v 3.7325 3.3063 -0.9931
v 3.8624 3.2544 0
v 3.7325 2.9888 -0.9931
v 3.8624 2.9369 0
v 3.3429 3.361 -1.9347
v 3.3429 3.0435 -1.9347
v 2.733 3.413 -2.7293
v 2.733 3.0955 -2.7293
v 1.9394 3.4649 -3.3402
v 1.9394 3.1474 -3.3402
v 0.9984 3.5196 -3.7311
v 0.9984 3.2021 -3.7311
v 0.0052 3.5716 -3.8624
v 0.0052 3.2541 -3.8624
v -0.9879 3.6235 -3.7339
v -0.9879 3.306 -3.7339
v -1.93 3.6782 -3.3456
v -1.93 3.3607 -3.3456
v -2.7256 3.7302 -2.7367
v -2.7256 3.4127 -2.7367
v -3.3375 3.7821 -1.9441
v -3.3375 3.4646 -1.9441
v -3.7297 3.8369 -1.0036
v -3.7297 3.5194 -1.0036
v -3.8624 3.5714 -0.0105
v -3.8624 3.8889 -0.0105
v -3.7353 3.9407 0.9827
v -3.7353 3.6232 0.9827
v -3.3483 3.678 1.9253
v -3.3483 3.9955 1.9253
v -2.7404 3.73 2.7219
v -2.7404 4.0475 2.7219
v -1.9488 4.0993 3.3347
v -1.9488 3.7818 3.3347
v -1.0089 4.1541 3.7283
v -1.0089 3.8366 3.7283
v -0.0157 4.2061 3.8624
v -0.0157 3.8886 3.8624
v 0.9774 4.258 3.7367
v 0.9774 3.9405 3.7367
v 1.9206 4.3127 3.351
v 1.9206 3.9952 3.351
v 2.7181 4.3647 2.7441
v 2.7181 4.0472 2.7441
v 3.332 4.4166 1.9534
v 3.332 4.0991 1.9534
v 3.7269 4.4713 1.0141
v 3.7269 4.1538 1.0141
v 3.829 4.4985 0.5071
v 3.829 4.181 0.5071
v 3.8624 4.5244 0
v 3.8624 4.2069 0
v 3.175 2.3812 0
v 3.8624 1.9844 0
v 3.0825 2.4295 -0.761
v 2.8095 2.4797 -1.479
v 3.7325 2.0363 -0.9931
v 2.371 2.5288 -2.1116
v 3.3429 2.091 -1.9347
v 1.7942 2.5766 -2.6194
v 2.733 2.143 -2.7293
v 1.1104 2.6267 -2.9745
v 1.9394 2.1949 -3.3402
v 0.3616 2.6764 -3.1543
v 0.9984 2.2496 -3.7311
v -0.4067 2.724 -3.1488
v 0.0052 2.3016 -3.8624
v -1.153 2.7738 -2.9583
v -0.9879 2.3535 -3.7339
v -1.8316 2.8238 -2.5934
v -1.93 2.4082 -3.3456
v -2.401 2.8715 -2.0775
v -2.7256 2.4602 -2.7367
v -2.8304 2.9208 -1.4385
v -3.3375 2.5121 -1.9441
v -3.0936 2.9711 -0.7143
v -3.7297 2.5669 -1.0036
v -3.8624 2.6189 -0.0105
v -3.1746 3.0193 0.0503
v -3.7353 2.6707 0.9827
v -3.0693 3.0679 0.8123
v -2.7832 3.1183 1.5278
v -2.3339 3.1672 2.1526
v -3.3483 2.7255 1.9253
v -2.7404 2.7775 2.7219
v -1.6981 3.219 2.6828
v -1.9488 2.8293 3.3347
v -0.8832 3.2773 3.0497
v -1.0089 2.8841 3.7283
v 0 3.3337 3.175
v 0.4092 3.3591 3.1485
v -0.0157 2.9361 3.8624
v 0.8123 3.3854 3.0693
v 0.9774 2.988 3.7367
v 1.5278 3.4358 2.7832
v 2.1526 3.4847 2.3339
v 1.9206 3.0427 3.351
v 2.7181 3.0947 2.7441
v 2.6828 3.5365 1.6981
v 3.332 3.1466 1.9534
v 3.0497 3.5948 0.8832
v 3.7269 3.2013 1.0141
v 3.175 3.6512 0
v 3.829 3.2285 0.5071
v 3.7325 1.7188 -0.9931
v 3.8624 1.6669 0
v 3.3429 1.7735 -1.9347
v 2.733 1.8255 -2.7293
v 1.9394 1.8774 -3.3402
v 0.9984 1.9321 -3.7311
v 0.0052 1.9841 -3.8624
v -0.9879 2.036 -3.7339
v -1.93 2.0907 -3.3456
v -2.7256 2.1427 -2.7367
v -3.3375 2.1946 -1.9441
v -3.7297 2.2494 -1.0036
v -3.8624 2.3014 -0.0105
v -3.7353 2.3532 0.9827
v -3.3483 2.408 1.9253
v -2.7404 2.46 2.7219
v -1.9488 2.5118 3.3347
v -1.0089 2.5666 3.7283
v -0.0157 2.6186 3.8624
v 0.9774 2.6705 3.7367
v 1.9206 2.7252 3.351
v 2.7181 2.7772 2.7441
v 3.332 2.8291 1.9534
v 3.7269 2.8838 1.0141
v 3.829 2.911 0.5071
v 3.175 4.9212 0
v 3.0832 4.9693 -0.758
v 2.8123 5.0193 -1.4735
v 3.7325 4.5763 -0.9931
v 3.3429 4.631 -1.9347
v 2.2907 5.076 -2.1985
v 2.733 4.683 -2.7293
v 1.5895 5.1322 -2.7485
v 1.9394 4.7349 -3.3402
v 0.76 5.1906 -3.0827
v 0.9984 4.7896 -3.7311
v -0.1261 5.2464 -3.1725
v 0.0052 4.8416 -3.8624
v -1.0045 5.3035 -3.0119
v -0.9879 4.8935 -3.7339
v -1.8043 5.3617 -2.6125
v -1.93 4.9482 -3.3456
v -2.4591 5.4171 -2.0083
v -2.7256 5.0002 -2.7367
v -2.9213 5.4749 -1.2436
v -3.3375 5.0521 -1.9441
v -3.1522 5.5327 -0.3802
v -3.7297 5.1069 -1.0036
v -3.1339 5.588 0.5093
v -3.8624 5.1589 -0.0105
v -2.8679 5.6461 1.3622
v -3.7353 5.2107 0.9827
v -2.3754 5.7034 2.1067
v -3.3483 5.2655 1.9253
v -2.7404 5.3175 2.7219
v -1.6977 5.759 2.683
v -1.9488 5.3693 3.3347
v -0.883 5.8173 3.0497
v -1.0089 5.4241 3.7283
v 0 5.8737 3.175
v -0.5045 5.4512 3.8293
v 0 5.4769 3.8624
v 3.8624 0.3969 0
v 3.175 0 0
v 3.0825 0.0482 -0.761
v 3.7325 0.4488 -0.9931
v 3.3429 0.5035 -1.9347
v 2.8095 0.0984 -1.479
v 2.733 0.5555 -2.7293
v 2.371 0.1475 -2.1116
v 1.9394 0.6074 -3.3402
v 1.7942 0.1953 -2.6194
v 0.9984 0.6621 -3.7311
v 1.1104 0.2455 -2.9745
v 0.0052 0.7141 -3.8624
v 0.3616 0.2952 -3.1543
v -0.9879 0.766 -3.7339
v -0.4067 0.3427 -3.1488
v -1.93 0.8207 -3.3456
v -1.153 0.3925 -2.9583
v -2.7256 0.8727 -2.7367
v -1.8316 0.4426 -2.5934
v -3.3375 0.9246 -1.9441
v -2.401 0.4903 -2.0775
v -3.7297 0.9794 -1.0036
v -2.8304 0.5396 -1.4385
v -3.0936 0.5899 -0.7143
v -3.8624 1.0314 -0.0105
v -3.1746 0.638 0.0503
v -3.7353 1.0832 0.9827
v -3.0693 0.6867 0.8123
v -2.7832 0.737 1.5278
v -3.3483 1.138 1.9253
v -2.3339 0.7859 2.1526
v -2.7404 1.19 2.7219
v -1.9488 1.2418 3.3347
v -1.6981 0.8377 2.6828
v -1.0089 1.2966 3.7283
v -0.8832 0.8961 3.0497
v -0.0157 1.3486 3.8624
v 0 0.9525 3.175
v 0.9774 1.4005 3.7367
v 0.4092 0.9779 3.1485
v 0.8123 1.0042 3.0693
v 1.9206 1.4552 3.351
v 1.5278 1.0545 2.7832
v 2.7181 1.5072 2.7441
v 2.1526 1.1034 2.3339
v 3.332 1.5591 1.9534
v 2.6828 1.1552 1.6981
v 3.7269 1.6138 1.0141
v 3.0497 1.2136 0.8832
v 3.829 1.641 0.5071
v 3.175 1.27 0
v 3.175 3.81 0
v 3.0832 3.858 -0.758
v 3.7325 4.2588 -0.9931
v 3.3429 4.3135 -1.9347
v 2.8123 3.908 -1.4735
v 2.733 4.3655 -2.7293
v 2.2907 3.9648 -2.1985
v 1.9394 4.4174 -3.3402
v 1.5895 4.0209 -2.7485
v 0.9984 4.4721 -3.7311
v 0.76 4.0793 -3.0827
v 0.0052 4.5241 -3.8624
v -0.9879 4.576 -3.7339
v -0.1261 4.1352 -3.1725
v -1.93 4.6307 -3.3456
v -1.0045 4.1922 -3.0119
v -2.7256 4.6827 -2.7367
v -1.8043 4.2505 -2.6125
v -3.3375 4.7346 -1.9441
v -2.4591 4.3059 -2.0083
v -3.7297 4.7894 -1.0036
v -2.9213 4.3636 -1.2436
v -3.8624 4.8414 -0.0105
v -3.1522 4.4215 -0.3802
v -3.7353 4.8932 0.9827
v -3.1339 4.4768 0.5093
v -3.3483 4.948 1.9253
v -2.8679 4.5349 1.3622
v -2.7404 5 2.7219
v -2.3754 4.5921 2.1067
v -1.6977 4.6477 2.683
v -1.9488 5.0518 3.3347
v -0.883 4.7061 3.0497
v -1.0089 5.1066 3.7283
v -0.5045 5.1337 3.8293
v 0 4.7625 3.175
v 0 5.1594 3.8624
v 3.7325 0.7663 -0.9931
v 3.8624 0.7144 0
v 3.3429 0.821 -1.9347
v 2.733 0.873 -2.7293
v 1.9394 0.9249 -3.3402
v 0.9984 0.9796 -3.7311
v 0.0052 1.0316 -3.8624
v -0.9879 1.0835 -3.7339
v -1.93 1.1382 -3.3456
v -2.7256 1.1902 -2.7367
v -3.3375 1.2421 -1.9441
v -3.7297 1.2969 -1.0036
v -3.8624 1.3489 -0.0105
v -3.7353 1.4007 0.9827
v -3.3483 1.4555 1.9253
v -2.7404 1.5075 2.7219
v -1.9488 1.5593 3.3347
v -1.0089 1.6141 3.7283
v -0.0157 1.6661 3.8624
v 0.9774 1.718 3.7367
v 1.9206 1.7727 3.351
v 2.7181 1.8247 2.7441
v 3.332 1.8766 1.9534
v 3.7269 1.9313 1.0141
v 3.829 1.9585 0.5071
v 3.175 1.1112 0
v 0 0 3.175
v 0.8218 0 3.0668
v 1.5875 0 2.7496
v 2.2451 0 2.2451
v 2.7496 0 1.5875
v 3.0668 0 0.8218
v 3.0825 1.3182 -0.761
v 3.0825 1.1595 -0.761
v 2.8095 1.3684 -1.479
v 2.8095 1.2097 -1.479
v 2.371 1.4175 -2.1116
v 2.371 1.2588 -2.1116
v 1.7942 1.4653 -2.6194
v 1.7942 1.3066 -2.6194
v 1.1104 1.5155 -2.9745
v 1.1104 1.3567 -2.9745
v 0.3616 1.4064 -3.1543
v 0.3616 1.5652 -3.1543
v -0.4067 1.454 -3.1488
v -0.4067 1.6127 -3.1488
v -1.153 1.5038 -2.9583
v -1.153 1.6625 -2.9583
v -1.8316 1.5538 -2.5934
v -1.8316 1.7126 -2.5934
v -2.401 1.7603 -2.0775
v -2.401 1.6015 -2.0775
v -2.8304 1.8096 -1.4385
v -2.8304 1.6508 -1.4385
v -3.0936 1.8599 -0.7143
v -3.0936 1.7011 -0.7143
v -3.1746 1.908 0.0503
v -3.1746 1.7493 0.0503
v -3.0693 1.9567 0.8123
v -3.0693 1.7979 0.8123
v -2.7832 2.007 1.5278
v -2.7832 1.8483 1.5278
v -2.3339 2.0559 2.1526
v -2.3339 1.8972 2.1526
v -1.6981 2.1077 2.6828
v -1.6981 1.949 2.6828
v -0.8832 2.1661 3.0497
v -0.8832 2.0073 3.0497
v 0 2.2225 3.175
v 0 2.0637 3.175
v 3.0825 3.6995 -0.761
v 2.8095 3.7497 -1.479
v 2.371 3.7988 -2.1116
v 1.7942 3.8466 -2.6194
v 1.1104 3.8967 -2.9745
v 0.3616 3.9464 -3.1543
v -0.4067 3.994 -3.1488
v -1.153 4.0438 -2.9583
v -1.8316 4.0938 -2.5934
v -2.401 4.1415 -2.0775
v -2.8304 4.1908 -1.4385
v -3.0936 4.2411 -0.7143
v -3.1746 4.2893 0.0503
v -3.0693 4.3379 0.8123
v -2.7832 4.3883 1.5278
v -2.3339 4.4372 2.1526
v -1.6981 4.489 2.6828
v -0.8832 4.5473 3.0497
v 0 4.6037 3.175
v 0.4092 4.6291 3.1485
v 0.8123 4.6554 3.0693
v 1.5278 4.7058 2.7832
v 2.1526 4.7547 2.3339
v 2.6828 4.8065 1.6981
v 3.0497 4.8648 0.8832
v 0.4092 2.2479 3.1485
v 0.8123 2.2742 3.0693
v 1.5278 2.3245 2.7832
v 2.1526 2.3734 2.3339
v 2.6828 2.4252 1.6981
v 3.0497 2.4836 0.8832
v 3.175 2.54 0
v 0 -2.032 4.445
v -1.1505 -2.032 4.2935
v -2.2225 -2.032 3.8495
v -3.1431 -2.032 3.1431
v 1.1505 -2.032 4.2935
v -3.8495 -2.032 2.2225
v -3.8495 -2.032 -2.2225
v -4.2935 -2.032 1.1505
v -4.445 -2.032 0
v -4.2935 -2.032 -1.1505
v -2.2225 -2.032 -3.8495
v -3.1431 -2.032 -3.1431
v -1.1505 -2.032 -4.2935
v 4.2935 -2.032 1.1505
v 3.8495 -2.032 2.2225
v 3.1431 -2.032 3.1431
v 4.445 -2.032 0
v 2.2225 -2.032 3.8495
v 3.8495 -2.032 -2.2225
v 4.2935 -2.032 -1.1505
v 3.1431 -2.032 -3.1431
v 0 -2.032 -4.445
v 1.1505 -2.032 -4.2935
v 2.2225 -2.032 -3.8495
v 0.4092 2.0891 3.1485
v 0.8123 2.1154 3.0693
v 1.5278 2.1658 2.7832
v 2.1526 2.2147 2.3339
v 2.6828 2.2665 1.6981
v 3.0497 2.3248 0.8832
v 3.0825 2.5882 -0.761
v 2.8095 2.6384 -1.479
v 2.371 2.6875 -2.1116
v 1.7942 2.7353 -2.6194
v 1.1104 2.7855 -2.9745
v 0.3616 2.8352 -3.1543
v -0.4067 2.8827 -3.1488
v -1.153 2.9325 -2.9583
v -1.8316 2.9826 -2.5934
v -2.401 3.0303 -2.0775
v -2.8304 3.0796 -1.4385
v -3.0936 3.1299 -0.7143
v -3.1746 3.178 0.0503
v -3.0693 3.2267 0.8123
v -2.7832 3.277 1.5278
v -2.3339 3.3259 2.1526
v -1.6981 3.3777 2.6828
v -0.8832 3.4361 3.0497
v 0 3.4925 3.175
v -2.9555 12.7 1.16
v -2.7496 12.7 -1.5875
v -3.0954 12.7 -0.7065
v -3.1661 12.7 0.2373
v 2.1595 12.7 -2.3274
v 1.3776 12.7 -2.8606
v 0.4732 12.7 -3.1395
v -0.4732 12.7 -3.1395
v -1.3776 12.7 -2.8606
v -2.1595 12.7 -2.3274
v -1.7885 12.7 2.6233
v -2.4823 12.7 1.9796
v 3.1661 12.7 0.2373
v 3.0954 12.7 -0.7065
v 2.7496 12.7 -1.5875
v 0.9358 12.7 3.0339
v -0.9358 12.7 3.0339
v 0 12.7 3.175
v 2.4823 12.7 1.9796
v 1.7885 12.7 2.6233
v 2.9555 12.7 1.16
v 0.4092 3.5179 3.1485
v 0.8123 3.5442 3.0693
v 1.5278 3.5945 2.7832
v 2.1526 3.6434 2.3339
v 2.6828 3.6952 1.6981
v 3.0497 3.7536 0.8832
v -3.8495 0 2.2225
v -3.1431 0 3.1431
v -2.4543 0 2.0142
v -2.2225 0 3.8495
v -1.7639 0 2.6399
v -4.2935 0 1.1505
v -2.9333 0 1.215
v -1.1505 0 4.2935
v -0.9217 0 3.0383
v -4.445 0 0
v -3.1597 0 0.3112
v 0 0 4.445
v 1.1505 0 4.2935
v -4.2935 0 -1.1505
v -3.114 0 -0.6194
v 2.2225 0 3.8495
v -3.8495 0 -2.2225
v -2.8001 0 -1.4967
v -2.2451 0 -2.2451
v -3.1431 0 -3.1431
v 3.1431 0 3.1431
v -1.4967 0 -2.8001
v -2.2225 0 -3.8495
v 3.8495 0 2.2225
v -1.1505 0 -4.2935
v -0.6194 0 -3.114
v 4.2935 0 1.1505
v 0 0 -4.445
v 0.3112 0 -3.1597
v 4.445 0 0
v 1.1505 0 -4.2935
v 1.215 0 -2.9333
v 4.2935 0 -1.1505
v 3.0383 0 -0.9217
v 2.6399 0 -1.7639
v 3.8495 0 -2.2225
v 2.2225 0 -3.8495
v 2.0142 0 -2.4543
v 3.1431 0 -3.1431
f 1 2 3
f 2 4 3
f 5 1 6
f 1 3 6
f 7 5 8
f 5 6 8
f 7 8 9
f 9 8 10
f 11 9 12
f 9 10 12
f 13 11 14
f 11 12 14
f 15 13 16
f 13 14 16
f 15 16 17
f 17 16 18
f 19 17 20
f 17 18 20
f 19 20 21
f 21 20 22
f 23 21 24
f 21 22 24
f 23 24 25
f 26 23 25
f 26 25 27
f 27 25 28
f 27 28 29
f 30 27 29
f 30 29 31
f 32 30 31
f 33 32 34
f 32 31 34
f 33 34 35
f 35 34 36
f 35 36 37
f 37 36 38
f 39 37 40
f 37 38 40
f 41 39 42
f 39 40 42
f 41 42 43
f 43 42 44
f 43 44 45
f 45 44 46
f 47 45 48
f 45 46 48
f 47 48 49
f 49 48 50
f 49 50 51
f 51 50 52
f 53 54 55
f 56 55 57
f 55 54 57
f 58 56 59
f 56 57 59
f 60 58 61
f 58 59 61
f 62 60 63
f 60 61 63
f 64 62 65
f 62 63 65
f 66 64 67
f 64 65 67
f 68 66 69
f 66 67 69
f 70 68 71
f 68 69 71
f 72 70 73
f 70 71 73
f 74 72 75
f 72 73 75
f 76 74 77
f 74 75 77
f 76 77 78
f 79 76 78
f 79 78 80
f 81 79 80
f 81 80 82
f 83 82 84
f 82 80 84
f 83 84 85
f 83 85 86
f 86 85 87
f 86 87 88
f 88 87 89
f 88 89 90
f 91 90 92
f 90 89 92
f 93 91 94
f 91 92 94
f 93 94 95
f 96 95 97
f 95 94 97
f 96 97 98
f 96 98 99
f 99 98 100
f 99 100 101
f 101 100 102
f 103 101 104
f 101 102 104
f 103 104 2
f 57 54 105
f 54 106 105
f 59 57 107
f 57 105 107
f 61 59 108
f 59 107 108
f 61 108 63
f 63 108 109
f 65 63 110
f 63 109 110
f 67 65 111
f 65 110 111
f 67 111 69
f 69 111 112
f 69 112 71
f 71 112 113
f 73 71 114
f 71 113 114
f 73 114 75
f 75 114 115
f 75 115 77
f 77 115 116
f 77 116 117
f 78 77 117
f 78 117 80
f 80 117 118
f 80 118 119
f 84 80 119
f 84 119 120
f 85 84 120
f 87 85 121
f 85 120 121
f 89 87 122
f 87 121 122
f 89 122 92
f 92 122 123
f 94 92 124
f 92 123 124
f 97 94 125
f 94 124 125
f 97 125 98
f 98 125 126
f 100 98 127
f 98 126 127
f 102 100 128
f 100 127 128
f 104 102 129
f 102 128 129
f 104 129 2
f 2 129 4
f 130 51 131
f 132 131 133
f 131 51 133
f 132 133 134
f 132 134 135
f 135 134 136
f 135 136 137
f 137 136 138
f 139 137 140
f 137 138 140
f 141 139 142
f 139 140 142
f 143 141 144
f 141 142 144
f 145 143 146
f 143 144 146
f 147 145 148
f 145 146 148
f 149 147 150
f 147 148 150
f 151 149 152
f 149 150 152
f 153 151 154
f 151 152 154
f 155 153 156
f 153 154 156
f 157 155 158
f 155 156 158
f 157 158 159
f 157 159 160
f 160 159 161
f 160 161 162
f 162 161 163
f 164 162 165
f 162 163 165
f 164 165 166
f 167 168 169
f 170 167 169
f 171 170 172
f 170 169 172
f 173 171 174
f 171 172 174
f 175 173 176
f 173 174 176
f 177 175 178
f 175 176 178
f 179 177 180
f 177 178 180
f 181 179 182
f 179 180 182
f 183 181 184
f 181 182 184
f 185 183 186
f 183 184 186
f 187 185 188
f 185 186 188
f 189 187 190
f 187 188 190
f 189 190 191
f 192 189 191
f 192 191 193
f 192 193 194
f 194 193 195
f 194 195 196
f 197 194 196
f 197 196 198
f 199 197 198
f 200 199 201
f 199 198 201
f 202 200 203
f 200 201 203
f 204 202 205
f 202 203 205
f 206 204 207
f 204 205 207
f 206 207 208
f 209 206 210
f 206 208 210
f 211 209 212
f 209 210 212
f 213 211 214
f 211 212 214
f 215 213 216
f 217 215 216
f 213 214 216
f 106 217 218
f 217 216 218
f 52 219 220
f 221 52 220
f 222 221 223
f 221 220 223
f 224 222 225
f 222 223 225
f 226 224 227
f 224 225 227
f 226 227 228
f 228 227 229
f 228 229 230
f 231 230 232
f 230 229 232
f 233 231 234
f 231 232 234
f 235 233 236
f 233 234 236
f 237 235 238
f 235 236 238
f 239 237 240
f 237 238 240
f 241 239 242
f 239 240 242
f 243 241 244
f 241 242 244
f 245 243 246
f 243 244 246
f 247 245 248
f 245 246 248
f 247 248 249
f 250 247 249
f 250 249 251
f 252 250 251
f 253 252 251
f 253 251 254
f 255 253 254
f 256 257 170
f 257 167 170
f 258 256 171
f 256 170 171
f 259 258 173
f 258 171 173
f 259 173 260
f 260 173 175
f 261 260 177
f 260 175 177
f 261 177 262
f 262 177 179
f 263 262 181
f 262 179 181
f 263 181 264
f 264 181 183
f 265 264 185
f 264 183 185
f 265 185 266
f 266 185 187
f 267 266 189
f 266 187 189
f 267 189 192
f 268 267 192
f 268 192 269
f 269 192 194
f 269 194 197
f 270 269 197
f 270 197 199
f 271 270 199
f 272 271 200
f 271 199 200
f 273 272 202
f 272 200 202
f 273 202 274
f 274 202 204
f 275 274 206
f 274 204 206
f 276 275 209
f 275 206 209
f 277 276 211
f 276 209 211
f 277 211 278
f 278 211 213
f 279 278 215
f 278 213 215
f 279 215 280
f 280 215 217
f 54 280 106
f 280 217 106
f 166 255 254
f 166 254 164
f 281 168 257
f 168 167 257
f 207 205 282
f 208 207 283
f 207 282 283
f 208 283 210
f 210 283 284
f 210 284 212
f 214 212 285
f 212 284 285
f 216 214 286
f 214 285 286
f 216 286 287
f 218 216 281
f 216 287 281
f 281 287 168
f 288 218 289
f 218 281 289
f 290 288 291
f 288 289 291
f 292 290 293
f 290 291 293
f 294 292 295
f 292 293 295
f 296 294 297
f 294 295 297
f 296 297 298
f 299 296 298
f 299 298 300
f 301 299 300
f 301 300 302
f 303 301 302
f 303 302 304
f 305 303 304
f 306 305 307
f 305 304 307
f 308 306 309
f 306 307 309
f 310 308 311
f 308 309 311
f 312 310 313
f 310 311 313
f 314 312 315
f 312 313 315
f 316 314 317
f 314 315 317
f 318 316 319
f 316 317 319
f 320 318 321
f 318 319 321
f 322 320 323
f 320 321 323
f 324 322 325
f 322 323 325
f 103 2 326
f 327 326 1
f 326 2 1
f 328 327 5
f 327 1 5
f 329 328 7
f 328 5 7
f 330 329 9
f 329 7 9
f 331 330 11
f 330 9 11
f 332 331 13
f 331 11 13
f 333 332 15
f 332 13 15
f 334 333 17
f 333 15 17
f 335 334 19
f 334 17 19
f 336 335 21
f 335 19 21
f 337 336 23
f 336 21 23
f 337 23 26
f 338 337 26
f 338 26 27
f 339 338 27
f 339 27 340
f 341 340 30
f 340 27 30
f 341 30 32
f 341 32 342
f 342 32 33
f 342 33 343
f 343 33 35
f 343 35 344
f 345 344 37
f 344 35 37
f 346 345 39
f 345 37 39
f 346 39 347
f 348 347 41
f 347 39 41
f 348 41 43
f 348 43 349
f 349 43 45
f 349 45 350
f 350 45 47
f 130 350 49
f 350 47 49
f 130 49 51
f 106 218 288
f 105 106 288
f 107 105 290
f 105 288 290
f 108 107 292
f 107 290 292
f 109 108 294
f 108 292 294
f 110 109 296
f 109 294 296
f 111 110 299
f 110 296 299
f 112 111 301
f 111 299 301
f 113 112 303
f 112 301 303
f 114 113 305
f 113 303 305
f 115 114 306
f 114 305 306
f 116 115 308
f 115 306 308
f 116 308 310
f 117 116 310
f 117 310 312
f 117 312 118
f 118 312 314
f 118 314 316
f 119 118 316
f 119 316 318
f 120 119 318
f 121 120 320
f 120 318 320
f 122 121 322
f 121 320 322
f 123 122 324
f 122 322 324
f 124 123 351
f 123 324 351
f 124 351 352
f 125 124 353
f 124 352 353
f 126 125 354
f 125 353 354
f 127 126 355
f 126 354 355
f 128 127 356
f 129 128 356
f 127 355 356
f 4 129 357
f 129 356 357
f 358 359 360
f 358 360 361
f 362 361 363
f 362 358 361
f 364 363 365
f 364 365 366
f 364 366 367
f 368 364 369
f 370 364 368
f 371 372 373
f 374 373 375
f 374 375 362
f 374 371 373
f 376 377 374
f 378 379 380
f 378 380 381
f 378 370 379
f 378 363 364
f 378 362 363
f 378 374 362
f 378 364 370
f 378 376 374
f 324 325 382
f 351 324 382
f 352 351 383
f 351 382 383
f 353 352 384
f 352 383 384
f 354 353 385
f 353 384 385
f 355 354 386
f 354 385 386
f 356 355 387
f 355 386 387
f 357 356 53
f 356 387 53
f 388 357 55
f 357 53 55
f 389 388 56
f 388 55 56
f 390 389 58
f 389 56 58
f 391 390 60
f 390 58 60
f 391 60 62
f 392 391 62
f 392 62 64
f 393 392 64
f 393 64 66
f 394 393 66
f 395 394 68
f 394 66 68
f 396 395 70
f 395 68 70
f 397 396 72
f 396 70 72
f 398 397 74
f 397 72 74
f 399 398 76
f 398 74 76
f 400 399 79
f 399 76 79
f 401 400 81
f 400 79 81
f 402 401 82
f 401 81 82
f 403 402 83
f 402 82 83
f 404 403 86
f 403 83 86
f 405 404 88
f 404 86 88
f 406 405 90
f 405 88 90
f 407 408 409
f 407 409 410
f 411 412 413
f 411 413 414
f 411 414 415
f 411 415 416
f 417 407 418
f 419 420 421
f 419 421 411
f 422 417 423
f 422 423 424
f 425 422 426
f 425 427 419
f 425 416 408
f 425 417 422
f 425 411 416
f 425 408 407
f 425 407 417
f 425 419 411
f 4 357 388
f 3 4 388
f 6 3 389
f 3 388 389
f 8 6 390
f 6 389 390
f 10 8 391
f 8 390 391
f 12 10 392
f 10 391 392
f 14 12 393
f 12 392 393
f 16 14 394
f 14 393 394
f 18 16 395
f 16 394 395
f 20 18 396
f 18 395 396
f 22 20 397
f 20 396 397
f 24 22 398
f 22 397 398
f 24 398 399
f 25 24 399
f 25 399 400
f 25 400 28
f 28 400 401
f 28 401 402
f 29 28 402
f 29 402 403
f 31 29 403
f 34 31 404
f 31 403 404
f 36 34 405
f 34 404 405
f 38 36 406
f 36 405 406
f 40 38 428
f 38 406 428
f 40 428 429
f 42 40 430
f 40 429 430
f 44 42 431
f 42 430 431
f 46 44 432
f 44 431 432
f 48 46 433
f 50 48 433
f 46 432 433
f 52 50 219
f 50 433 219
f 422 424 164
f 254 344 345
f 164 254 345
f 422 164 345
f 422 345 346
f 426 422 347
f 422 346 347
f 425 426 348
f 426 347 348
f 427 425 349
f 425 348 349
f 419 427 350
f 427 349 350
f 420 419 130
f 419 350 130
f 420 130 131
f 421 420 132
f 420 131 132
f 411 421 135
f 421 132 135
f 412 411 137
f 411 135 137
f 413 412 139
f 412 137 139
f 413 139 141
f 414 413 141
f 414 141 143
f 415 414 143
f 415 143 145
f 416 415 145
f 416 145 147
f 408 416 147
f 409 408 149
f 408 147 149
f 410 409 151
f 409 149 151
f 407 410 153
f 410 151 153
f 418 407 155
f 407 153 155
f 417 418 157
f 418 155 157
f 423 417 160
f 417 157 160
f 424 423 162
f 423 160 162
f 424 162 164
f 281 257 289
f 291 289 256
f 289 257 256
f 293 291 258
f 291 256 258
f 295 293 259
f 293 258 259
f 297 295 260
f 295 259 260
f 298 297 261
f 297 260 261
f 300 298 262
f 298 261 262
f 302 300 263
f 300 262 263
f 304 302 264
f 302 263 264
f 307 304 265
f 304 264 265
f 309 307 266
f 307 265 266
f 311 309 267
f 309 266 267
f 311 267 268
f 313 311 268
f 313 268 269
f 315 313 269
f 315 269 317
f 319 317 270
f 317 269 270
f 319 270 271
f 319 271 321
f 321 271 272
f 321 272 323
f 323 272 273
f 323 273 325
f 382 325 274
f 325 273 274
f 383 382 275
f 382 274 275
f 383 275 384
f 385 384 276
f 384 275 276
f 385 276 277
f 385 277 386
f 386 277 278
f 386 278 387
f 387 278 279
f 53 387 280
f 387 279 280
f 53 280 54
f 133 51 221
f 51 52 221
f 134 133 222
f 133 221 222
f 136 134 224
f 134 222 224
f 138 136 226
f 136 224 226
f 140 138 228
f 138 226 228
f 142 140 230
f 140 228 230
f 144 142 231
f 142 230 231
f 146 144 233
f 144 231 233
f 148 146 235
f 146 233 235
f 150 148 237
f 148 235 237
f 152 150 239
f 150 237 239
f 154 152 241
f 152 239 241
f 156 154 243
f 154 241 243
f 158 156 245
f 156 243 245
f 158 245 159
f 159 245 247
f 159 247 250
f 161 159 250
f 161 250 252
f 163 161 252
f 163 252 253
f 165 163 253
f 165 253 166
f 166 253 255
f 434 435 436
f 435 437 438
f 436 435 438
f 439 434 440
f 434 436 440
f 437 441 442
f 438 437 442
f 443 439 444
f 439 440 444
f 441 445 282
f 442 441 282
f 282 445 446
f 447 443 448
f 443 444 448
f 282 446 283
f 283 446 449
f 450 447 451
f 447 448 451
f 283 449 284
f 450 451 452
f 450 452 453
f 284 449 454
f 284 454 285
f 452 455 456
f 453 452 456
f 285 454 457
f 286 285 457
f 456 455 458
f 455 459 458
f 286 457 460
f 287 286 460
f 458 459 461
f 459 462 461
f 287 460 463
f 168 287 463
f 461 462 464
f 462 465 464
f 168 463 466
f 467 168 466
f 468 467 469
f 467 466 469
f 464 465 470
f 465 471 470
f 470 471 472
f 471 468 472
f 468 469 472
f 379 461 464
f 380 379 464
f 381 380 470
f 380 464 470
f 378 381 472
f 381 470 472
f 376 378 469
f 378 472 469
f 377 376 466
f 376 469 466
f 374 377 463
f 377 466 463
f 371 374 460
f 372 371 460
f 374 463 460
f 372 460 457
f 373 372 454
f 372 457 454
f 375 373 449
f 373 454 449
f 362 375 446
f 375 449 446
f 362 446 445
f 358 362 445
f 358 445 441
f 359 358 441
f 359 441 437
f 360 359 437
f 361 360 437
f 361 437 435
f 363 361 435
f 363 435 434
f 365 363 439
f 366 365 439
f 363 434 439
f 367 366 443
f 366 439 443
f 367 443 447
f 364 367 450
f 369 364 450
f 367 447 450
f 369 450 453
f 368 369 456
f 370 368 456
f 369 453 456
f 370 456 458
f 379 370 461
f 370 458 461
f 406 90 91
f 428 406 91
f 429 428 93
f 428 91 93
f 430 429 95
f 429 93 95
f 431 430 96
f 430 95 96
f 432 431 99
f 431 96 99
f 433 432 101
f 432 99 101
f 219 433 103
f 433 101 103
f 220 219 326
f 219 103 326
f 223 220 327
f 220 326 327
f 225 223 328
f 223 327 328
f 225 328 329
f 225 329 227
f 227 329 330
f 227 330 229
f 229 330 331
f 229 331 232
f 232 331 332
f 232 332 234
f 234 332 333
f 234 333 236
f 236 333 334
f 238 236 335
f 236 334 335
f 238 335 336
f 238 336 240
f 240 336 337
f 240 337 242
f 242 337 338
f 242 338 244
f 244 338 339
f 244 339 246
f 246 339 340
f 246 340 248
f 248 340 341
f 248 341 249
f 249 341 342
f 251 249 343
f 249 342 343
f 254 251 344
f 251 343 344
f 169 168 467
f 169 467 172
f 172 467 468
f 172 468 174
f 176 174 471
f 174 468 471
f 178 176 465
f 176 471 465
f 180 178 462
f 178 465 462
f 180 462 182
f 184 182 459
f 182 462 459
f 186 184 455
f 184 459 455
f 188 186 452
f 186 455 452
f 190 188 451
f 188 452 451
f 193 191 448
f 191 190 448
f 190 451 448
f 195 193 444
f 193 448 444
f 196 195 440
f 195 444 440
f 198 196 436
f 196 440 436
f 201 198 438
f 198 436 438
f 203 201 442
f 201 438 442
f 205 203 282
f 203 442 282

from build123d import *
from build123d.topology import SkipClean

# Parameters (mm, degrees)
SKETCH2_R           = 3.175
BOSS_EXTRUDE1_DEPTH = 12.7
SKETCH3_R           = 4.445
BOSS_EXTRUDE2_DEPTH = 2.032
THREAD1_PITCH       = 1.27


with BuildPart() as part:
    # Sketch2 → Boss-Extrude1 (new body)
    with BuildSketch(Plane(origin=(0, 0, 0), x_dir=(1, 0, 0), z_dir=(0, 1, 0))):
        with Locations(Location((0, 0, 0), (0, 0, 270))):
            Circle(SKETCH2_R)
    extrude(amount=BOSS_EXTRUDE1_DEPTH)

    # Sketch3 → Boss-Extrude2 (add)
    with BuildSketch(Plane(origin=(0, 0, 0), x_dir=(-1, 0, 0), z_dir=(0, -1, 0))):
        with Locations(Location((0, 0, 0), (0, 0, 90))):
            Circle(SKETCH3_R)
    extrude(amount=BOSS_EXTRUDE2_DEPTH)

    # Thread1: the profile of Thread Profile1 profile screwed along a right-hand helix of 3.75 turns, 8 arcs to a turn; built about Z, then put on its axis
    with SkipClean():  # the faces are left unmerged after this step: merging them gives an invalid solid
        thread1_z = Axis((0, 0, 0), (0, 0, 1))
        thread1_corners = [(3.1747, 0, -0.000173205), (3.1747, 0, 1.111423202), (3.862407661, 0, 0.714374998), (3.862407661, 0, 0.396874998)]
        with BuildLine(mode=Mode.PRIVATE) as thread1_profile:
            Line(thread1_corners[0], thread1_corners[1])
            Line(thread1_corners[1], thread1_corners[2])
            Line(thread1_corners[2], thread1_corners[3])
            Line(thread1_corners[3], thread1_corners[0])
        thread1_cap = Face(thread1_profile.wire())
        thread1_turn_angles = [0, 22.5, 45, 67.5, 90, 112.5, 135, 157.5, 180, 202.5, 225, 247.5, 270, 292.5, 315, 337.5, 360]
        thread1_turn_weights = [1, 0.9238795325112867, 1, 0.9238795325112867, 1, 0.9238795325112867, 1, 0.9238795325112867, 1, 0.9238795325112867, 1, 0.9238795325112867, 1, 0.9238795325112867, 1, 0.9238795325112867, 1]
        thread1_turn_rails = [Edge.make_bspline([Vector(p[0], p[1], 0).rotate(thread1_z, thread1_turn_angles[k]) / thread1_turn_weights[k] + Vector(0, 0, p[2] + THREAD1_PITCH * thread1_turn_angles[k] / 360) for k in range(17)], [0, 0, 0, 1, 1, 2, 2, 3, 3, 4, 4, 5, 5, 6, 6, 7, 7, 8, 8, 8], 2, thread1_turn_weights) for p in thread1_corners]
        thread1_turn_sides = [Face.make_surface_from_curves(thread1_turn_rails[p[0]], thread1_turn_rails[p[1]]) for p in [(0, 1), (1, 2), (2, 3), (3, 0)]]
        thread1_last_angles = [1080, 1102.5, 1125, 1147.5, 1170, 1192.5, 1215, 1237.5, 1260, 1282.5, 1305, 1327.5, 1350]
        thread1_last_weights = [1, 0.9238795325112867, 1, 0.9238795325112867, 1, 0.9238795325112867, 1, 0.9238795325112867, 1, 0.9238795325112867, 1, 0.9238795325112867, 1]
        thread1_last_rails = [Edge.make_bspline([Vector(p[0], p[1], 0).rotate(thread1_z, thread1_last_angles[k]) / thread1_last_weights[k] + Vector(0, 0, p[2] + THREAD1_PITCH * thread1_last_angles[k] / 360) for k in range(13)], [0, 0, 0, 1, 1, 2, 2, 3, 3, 4, 4, 5, 5, 6, 6, 6], 2, thread1_last_weights) for p in thread1_corners]
        thread1_last_sides = [Face.make_surface_from_curves(thread1_last_rails[p[0]], thread1_last_rails[p[1]]) for p in [(0, 1), (1, 2), (2, 3), (3, 0)]]
        thread1 = Plane(origin=(0, 0, 0), x_dir=(1, 0, 0), z_dir=(0, 1, 0)) * Solid(Shell([*[p.moved(Location((0, 0, THREAD1_PITCH * i))) for i in range(3) for p in thread1_turn_sides], *thread1_last_sides, thread1_cap, thread1_cap.rotate(thread1_z, 1350).moved(Location((0, 0, THREAD1_PITCH * 1350 / 360)))]))
        add(thread1)


solid = part.part
